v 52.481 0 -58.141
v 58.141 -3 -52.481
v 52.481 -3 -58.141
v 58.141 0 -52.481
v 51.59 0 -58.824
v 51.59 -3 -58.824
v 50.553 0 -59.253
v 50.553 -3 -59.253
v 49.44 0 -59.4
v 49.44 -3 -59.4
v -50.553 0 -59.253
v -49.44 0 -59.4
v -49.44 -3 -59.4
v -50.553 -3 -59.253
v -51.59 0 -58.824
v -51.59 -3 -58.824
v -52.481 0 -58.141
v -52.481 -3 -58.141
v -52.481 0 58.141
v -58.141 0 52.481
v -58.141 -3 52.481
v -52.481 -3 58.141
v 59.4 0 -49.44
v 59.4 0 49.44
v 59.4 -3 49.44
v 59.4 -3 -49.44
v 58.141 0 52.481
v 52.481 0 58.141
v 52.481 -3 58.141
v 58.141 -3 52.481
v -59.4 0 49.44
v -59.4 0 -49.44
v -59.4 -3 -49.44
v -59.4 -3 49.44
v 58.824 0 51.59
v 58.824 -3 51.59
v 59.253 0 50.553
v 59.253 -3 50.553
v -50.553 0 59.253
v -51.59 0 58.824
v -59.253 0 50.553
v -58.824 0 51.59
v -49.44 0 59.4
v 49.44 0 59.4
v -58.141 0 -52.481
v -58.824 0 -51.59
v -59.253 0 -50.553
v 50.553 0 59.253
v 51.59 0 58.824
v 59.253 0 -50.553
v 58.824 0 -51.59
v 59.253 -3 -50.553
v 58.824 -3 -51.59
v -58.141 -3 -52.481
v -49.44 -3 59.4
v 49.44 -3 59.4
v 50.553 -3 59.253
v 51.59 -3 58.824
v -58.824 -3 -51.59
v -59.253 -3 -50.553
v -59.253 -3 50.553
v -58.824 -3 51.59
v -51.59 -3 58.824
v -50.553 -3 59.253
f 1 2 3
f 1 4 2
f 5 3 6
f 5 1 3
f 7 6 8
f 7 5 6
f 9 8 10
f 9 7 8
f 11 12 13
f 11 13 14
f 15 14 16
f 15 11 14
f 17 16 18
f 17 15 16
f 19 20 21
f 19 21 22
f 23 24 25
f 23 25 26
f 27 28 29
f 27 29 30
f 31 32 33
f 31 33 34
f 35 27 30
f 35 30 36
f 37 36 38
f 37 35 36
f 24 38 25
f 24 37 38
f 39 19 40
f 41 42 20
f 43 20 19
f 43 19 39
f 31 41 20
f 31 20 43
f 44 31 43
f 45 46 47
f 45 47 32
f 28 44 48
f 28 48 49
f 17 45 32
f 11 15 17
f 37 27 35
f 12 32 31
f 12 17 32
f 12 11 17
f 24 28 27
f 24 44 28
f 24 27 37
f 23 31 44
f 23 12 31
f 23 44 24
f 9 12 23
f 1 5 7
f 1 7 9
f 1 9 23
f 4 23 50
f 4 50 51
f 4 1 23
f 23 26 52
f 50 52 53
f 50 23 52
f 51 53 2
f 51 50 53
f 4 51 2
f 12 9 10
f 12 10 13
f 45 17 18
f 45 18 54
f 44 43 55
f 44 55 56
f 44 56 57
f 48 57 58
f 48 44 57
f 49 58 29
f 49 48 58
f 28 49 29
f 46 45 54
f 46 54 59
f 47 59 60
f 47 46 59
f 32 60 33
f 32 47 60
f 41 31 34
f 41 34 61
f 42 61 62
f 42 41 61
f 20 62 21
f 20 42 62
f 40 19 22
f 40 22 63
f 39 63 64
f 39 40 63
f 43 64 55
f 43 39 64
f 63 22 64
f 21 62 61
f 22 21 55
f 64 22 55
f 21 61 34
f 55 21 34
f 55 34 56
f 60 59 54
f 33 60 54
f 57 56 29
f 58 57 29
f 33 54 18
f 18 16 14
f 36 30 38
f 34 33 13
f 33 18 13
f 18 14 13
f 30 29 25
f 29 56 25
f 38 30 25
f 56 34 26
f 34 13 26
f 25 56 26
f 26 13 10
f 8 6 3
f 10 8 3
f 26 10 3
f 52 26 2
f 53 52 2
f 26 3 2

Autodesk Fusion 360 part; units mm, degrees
sketch "Sketch1" plane through (0, 0, 0) normal (0, 1, 0) x (1, 0, 0)
  line L0 (57.9284, 52.2684) -> (52.2684, 57.9284)
  arc A0 (52.2684, 57.9284) -> (49.44, 59.1) centre (49.44, 55.1) ccw
  line L1 (49.44, 59.1) -> (-49.44, 59.1)
  arc A1 (-49.44, 59.1) -> (-52.2684, 57.9284) centre (-49.44, 55.1) ccw
  line L2 (-52.2684, 57.9284) -> (-57.9284, 52.2684)
  arc A2 (-57.9284, 52.2684) -> (-59.1, 49.44) centre (-55.1, 49.44) ccw
  line L3 (-59.1, 49.44) -> (-59.1, -49.44)
  arc A3 (-59.1, -49.44) -> (-57.9284, -52.2684) centre (-55.1, -49.44) ccw
  line L4 (-57.9284, -52.2684) -> (-52.2684, -57.9284)
  arc A4 (-52.2684, -57.9284) -> (-49.44, -59.1) centre (-49.44, -55.1) ccw
  line L5 (-49.44, -59.1) -> (49.44, -59.1)
  arc A5 (49.44, -59.1) -> (52.2684, -57.9284) centre (49.44, -55.1) ccw
  line L6 (52.2684, -57.9284) -> (57.9284, -52.2684)
  arc A6 (57.9284, -52.2684) -> (59.1, -49.44) centre (55.1, -49.44) ccw
  line L7 (59.1, -49.44) -> (59.1, 49.44)
  arc A7 (59.1, 49.44) -> (57.9284, 52.2684) centre (55.1, 49.44) ccw
  line L8 (-57.2213, -51.5613) -> (-51.5613, -57.2213)
  arc A8 (-51.5613, -57.2213) -> (-49.44, -58.1) centre (-49.44, -55.1) ccw
  line L9 (-49.44, -58.1) -> (49.44, -58.1)
  arc A9 (49.44, -58.1) -> (51.5613, -57.2213) centre (49.44, -55.1) ccw
  line L10 (51.5613, -57.2213) -> (57.2213, -51.5613)
  arc A10 (57.2213, -51.5613) -> (58.1, -49.44) centre (55.1, -49.44) ccw
  line L11 (58.1, -49.44) -> (58.1, 49.44)
  arc A11 (58.1, 49.44) -> (57.2213, 51.5613) centre (55.1, 49.44) ccw
  line L12 (57.2213, 51.5613) -> (51.5613, 57.2213)
  arc A12 (51.5613, 57.2213) -> (49.44, 58.1) centre (49.44, 55.1) ccw
  line L13 (49.44, 58.1) -> (-49.44, 58.1)
  arc A13 (-49.44, 58.1) -> (-51.5613, 57.2213) centre (-49.44, 55.1) ccw
  line L14 (-51.5613, 57.2213) -> (-57.2213, 51.5613)
  arc A14 (-57.2213, 51.5613) -> (-58.1, 49.44) centre (-55.1, 49.44) ccw
  line L15 (-58.1, 49.44) -> (-58.1, -49.44)
  arc A15 (-58.1, -49.44) -> (-57.2213, -51.5613) centre (-55.1, -49.44) ccw
  line L16 (-59.1, 35) -> (59.1, 35)
  line L17 (59.1, 35) -> (59.1, 25)
  line L18 (59.1, 25) -> (-59.1, 25)
  line L19 (-59.1, 25) -> (-59.1, 35)
  line L20 (-59.1, -25) -> (59.1, -25)
  line L21 (59.1, -25) -> (59.1, -35)
  line L22 (59.1, -35) -> (-59.1, -35)
  line L23 (-59.1, -35) -> (-59.1, -25)
  line L24 (-35, 59.1) -> (-25, 59.1)
  line L25 (-25, 59.1) -> (-25, -59.1)
  line L26 (-25, -59.1) -> (-35, -59.1)
  line L27 (-35, -59.1) -> (-35, 59.1)
  line L28 (25, 59.1) -> (35, 59.1)
  line L29 (35, 59.1) -> (35, -59.1)
  line L30 (35, -59.1) -> (25, -59.1)
  line L31 (25, -59.1) -> (25, 59.1)
  line L32 (58.777, 53.117) -> (53.117, 58.777)
  arc A16 (53.117, 58.777) -> (49.44, 60.3) centre (49.44, 55.1) ccw
  line L33 (49.44, 60.3) -> (-49.44, 60.3)
  arc A17 (-49.44, 60.3) -> (-53.117, 58.777) centre (-49.44, 55.1) ccw
  line L34 (-53.117, 58.777) -> (-58.777, 53.117)
  arc A18 (-58.777, 53.117) -> (-60.3, 49.44) centre (-55.1, 49.44) ccw
  line L35 (-60.3, 49.44) -> (-60.3, -49.44)
  arc A19 (-60.3, -49.44) -> (-58.777, -53.117) centre (-55.1, -49.44) ccw
  line L36 (-58.777, -53.117) -> (-53.117, -58.777)
  arc A20 (-53.117, -58.777) -> (-49.44, -60.3) centre (-49.44, -55.1) ccw
  line L37 (-49.44, -60.3) -> (49.44, -60.3)
  arc A21 (49.44, -60.3) -> (53.117, -58.777) centre (49.44, -55.1) ccw
  line L38 (53.117, -58.777) -> (58.777, -53.117)
  arc A22 (58.777, -53.117) -> (60.3, -49.44) centre (55.1, -49.44) ccw
  line L39 (60.3, -49.44) -> (60.3, 49.44)
  arc A23 (60.3, 49.44) -> (58.777, 53.117) centre (55.1, 49.44) ccw
  line L40 (58.1406, 52.4806) -> (52.4806, 58.1406)
  arc A24 (52.4806, 58.1406) -> (49.44, 59.4) centre (49.44, 55.1) ccw
  line L41 (49.44, 59.4) -> (-49.44, 59.4)
  arc A25 (-49.44, 59.4) -> (-52.4806, 58.1406) centre (-49.44, 55.1) ccw
  line L42 (-52.4806, 58.1406) -> (-58.1406, 52.4806)
  arc A26 (-58.1406, 52.4806) -> (-59.4, 49.44) centre (-55.1, 49.44) ccw
  line L43 (-59.4, 49.44) -> (-59.4, -49.44)
  arc A27 (-59.4, -49.44) -> (-58.1406, -52.4806) centre (-55.1, -49.44) ccw
  line L44 (-58.1406, -52.4806) -> (-52.4806, -58.1406)
  arc A28 (-52.4806, -58.1406) -> (-49.44, -59.4) centre (-49.44, -55.1) ccw
  line L45 (-49.44, -59.4) -> (49.44, -59.4)
  arc A29 (49.44, -59.4) -> (52.4806, -58.1406) centre (49.44, -55.1) ccw
  line L46 (52.4806, -58.1406) -> (58.1406, -52.4806)
  arc A30 (58.1406, -52.4806) -> (59.4, -49.44) centre (55.1, -49.44) ccw
  line L47 (59.4, -49.44) -> (59.4, 49.44)
  arc A31 (59.4, 49.44) -> (58.1406, 52.4806) centre (55.1, 49.44) ccw
  dimension "d27" = 118.2
  dimension "d28" = 118.2
  dimension "d29" = 59.1
  dimension "d30" = 59.1
  dimension "d31" = 4
  dimension "d32" = 4
  dimension "d33" = 4
  dimension "d34" = 4
  dimension "d35" = 9.66
  dimension "d36" = 9.66
  dimension "d37" = 9.66
  dimension "d38" = 9.66
  dimension "d39" = 4
  dimension "d40" = 4
  dimension "d41" = 4
  dimension "d42" = 4
  dimension "d43" = 9.66
  dimension "d44" = 9.66
  dimension "d45" = 9.66
  dimension "d46" = 9.66
  dimension "d47" = -1
  dimension "d48" = 50
  dimension "d49" = 25
  dimension "d50" = 10
  dimension "d51" = 10
  dimension "d52" = 50
  dimension "d53" = 10
  dimension "d54" = 10
  dimension "d55" = 25
  dimension "d59" = 1.2
  dimension "d60" = 120.6
  dimension "d61" = 0.3
extrude "Extrude1" add sketch "Sketch1" against normal blind 3 contours L0 A0 L1 L7 A7 L11 A11 L12 A12 L13 L16 L29 | L7 L11 L16 L17 L18 | L1 L13 L28 L29 L31 | L7 L11 L18 L20 | L11 A11 L12 A12 L13 L16 L29 | L11 L16 L18 L29 | L1 L13 L25 L31 | L13 L16 L29 L31 | L7 L11 L20 L21 L22 | L11 L18 L20 L29 | L16 L18 L29 L31 | L1 L13 L24 L25 L27 | L13 L16 L25 L31 | L5 A5 L6 A6 L7 L9 A9 L10 A10 L11 L22 L29 | L11 L20 L22 L29 | L18 L20 L29 L31 | L16 L18 L25 L31 | L1 A1 L2 A2 L3 L13 A13 L14 A14 L15 L16 L27 | L13 L16 L25 L27 | L9 A9 L10 A10 L11 L22 L29 | L20 L22 L29 L31 | L18 L20 L25 L31 | L16 L18 L25 L27 | L13 A13 L14 A14 L15 L16 L27 | L9 L22 L29 L31 | L20 L22 L25 L31 | L18 L20 L25 L27 | L15 L16 L18 L27 | L9 L22 L25 L31 | L5 L9 L29 L30 L31 | L20 L22 L25 L27 | L15 L18 L20 L27 | L3 L15 L16 L18 L19 | L9 L22 L25 L27 | L5 L9 L25 L31 | L15 L20 L22 L27 | L3 L15 L18 L20 | L8 A8 L9 L15 A15 L22 L27 | L5 L9 L25 L26 L27 | L3 L15 L20 L22 L23 | L3 A3 L4 A4 L5 L8 A8 L9 L15 A15 L22 L27 | L40 A24 L41 A25 L42 A26 L43 A27 L44 A28 L45 A29 L46 A30 L47 A31
equation "d29 = d28 / 2"
equation "d30 = d27 / 2"
equation "d49 = d48 / 2"
equation "d55 = d52 / 2"
